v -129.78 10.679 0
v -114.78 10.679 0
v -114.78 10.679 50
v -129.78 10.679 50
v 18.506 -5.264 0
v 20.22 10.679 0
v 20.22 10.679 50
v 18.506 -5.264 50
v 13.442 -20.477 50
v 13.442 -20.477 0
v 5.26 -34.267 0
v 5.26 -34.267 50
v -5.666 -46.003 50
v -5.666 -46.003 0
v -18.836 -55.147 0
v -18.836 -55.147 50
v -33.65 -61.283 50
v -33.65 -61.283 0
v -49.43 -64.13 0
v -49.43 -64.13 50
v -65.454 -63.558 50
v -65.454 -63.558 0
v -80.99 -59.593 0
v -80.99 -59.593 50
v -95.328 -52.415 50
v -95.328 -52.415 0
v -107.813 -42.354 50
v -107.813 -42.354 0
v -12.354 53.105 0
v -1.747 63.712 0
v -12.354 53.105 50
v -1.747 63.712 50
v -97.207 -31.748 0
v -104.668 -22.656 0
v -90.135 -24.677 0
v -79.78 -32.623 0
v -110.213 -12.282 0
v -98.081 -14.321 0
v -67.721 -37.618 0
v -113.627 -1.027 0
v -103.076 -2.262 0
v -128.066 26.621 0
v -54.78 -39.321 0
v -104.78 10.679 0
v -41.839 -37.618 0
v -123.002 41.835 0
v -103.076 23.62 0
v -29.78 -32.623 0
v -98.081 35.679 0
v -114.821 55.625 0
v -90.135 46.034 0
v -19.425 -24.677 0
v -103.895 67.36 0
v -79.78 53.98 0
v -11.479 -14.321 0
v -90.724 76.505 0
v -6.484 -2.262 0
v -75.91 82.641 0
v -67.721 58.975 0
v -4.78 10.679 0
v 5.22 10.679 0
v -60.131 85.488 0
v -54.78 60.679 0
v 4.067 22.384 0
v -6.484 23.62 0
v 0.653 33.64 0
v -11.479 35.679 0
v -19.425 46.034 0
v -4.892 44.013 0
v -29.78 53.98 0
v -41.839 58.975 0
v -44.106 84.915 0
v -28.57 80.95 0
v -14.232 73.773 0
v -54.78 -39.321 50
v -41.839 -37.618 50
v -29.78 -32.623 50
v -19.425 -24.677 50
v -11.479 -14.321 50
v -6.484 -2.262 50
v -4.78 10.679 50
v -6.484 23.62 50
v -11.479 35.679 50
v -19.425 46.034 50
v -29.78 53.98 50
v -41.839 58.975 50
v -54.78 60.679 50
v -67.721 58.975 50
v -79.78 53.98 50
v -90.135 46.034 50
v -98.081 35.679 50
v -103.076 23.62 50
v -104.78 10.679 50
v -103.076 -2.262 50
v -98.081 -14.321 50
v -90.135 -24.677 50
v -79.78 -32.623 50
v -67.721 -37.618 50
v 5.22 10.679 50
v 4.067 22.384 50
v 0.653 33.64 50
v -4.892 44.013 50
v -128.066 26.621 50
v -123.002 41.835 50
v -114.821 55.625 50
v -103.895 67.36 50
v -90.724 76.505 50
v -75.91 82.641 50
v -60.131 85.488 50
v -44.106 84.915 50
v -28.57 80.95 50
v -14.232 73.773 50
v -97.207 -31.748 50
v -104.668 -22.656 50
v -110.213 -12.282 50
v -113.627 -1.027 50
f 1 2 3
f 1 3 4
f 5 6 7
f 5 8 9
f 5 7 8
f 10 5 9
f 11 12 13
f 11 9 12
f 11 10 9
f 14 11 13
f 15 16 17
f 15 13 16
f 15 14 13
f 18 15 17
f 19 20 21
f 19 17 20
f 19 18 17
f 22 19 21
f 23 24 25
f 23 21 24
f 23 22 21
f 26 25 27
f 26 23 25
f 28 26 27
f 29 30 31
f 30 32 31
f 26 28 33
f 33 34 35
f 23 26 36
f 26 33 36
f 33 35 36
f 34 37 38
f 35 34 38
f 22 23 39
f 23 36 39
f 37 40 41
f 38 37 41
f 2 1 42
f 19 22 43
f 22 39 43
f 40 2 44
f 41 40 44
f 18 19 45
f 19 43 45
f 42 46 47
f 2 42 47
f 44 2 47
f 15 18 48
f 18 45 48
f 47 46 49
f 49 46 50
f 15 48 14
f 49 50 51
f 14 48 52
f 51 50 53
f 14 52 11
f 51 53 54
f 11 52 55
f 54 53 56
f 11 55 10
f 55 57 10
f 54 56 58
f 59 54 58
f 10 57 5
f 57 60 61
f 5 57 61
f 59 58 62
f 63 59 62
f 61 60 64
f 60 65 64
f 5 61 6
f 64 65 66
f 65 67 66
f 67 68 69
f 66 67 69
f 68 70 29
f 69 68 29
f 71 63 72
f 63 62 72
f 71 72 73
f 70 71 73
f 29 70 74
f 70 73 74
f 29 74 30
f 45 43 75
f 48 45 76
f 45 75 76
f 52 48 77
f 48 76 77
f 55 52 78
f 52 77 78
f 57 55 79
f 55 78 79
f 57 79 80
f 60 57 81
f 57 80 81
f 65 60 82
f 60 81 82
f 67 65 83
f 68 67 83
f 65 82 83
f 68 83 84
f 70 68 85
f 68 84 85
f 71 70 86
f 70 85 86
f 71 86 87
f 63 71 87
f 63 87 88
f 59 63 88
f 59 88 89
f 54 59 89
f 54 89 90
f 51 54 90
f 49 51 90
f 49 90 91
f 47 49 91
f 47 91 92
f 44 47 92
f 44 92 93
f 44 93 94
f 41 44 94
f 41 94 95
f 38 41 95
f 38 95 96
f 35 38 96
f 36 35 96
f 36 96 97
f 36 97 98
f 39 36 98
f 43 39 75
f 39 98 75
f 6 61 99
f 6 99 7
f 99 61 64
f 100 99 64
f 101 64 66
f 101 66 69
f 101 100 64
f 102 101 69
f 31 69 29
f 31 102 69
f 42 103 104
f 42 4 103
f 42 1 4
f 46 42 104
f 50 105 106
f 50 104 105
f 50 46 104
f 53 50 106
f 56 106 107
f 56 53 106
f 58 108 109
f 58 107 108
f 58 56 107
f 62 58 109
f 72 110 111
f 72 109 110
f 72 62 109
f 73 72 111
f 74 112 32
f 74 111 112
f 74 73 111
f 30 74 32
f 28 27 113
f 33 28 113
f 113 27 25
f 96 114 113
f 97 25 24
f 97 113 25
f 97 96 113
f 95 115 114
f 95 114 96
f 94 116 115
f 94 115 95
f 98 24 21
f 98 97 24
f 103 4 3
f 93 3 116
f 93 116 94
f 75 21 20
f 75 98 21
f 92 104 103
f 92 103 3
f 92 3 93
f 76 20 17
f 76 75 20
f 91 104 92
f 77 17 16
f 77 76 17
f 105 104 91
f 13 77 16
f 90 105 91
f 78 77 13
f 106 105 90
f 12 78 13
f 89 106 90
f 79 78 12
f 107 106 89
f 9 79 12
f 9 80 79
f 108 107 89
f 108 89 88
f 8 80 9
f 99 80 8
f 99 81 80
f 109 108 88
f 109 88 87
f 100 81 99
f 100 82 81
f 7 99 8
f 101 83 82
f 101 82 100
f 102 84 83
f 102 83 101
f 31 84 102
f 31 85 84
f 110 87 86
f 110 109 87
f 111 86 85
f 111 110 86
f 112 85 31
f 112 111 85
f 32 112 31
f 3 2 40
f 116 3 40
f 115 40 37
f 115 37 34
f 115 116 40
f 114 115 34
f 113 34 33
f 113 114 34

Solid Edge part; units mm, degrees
sketch "Sketch1" plane through (0, 0, 0) normal (0, 0, 1) x (1, 0, 0)
  circle A0 centre (-54.7801, 10.6787) radius 75
extrude "Protrusion1" add sketch "Sketch1" along normal blind 50
hole "Hole_1" at (-54.7801, 10.6787, 50) direction (0, 0, -1) diameter 100 end up to next
sketch "Sketch2" plane through (-54.7801, 10.6787, 50) normal (0, 0, 1) x (1, 0, 0)
  arc A0 (60, 0) -> (42.4264, 42.4264) centre (0, 0) ccw
  line L0 (56.5685, 56.5685) -> (42.4264, 42.4264)
  arc A1 (80, 0) -> (56.5685, 56.5685) centre (0, 0) ccw
  line L1 (60, 0) -> (80, 0)
extrude "Cutout1" cut sketch "Sketch2" against normal through all
pattern_circular "Pattern1" count 2 over 360 about axis through (-54.7801, 10.6787, 50) along (0, 0, -1) of "Cutout1"
